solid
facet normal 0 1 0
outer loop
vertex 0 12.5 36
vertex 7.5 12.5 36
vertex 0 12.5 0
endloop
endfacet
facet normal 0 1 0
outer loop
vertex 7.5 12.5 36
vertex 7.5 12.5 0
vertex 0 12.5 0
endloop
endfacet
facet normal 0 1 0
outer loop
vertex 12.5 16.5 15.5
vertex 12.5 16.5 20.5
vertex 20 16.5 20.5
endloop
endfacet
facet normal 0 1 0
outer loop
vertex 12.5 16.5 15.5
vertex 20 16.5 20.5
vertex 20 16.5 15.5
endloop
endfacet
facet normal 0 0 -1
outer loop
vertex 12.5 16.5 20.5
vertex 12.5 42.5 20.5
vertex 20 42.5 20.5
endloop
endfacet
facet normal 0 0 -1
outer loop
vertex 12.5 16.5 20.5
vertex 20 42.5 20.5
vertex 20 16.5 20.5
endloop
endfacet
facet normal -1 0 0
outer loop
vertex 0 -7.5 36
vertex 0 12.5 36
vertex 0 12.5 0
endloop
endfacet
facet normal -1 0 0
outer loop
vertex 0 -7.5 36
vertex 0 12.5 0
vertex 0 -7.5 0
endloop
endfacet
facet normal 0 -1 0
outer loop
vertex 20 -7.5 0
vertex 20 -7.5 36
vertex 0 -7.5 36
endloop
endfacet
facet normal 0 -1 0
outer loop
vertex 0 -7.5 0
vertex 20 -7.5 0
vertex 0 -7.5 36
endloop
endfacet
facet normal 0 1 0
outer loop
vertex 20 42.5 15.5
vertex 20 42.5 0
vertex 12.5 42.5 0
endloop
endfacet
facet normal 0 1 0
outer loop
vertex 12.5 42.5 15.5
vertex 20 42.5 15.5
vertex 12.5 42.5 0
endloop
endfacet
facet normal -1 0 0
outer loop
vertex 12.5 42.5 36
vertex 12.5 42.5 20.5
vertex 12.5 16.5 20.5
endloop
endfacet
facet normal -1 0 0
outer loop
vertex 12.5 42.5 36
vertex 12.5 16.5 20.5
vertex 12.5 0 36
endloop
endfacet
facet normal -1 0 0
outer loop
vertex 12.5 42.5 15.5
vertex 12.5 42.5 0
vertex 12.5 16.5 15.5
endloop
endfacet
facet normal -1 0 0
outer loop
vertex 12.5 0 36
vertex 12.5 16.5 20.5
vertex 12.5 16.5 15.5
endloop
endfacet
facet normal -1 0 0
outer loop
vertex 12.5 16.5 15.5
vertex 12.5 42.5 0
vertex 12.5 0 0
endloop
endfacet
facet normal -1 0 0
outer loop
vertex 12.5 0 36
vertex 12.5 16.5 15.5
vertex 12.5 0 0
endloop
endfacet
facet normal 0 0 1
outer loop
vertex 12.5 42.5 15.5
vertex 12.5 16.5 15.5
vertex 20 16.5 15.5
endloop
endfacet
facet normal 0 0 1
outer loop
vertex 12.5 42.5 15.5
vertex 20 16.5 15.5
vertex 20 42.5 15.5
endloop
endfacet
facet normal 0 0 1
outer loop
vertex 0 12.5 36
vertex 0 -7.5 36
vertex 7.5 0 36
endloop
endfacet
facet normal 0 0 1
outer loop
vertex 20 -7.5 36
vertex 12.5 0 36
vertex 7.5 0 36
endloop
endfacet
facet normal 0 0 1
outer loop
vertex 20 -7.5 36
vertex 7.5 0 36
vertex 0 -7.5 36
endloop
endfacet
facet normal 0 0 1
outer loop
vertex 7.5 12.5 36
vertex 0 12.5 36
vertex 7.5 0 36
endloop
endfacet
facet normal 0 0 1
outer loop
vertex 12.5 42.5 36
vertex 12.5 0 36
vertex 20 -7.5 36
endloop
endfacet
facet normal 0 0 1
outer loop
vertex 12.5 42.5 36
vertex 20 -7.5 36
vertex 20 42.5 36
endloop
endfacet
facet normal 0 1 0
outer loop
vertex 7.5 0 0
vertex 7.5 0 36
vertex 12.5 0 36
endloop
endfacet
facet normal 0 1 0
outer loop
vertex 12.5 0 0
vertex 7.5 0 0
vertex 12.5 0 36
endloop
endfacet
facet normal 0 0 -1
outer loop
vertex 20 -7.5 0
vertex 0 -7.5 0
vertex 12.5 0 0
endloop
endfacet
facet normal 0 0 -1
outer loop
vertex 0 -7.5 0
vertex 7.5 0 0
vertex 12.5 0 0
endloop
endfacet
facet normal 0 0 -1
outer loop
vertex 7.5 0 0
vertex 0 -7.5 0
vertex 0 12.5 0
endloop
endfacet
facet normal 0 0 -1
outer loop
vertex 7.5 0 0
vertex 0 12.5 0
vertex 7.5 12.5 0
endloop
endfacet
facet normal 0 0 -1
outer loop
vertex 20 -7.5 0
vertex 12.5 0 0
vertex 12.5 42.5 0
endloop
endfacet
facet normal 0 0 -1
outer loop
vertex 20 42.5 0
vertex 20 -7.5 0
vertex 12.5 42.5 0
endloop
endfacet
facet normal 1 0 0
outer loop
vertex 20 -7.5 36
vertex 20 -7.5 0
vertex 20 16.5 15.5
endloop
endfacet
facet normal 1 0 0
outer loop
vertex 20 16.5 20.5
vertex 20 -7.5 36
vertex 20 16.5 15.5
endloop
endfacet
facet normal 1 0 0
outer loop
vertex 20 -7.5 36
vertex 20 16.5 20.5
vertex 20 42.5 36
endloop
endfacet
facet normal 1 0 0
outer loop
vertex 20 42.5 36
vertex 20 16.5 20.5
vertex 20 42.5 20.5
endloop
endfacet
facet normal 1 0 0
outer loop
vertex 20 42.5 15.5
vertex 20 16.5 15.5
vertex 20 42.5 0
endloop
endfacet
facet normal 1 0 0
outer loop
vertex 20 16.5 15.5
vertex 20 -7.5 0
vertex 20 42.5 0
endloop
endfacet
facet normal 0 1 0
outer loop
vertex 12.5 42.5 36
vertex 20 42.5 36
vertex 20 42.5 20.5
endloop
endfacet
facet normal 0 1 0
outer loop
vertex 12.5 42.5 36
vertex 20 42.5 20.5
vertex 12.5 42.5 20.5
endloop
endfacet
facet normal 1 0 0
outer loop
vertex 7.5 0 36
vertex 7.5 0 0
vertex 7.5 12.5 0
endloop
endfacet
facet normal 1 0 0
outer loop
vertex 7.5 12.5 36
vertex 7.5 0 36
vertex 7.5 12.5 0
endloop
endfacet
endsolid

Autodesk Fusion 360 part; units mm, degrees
sketch "Sketch1" plane through (0, 0, 0) normal (0, 0, 1) x (1, 0, 0)
  line L0 (0, 0) -> (7.5, 0)
  line L1 (7.5, 0) -> (7.5, 12.5)
  line L2 (7.5, 12.5) -> (0, 12.5)
  line L3 (0, 12.5) -> (0, 0)
  line L4 (0, 0) -> (12.5, 0)
  line L5 (12.5, 0) -> (12.5, -7.5)
  line L6 (12.5, -7.5) -> (0, -7.5)
  line L7 (0, -7.5) -> (0, 0)
  line L8 (12.5, -7.5) -> (20, -7.5)
  line L9 (20, -7.5) -> (20, 42.5)
  line L10 (20, 42.5) -> (12.5, 42.5)
  line L11 (12.5, 42.5) -> (12.5, -7.5)
  dimension "d1" = 12.5
  dimension "d2" = 50
  dimension "d3" = 7.5
  dimension "d4" = 7.5
  dimension "d5" = 7.5
  dimension "d6" = 12.5
extrude "Extrude1" add sketch "Sketch1" along normal blind 36
sketch "Sketch2" plane through (20, 0, 0) normal (1, 0, 0) x (0, 1, 0)
  line L0 (-7.5, 36) -> (42.5, 36)
  line L1 (42.5, 36) -> (42.5, 0)
  line L2 (42.5, 0) -> (-7.5, 0)
  line L3 (-7.5, 0) -> (-7.5, 36)
  line L4 (42.5, 20.5) -> (16.5, 20.5)
  line L5 (16.5, 20.5) -> (16.5, 15.5)
  line L6 (16.5, 15.5) -> (42.5, 15.5)
  line L7 (42.5, 15.5) -> (42.5, 20.5)
  dimension "d13" = 15.5
  dimension "d14" = 15.5
  dimension "d16" = 24
  dimension "d17" = 50
  dimension "d19" = 36
  dimension "d21" = 5
extrude "Extrude2" cut sketch "Sketch2" along normal through all and the other way through all contours L1 L4 L5 L6 L7
